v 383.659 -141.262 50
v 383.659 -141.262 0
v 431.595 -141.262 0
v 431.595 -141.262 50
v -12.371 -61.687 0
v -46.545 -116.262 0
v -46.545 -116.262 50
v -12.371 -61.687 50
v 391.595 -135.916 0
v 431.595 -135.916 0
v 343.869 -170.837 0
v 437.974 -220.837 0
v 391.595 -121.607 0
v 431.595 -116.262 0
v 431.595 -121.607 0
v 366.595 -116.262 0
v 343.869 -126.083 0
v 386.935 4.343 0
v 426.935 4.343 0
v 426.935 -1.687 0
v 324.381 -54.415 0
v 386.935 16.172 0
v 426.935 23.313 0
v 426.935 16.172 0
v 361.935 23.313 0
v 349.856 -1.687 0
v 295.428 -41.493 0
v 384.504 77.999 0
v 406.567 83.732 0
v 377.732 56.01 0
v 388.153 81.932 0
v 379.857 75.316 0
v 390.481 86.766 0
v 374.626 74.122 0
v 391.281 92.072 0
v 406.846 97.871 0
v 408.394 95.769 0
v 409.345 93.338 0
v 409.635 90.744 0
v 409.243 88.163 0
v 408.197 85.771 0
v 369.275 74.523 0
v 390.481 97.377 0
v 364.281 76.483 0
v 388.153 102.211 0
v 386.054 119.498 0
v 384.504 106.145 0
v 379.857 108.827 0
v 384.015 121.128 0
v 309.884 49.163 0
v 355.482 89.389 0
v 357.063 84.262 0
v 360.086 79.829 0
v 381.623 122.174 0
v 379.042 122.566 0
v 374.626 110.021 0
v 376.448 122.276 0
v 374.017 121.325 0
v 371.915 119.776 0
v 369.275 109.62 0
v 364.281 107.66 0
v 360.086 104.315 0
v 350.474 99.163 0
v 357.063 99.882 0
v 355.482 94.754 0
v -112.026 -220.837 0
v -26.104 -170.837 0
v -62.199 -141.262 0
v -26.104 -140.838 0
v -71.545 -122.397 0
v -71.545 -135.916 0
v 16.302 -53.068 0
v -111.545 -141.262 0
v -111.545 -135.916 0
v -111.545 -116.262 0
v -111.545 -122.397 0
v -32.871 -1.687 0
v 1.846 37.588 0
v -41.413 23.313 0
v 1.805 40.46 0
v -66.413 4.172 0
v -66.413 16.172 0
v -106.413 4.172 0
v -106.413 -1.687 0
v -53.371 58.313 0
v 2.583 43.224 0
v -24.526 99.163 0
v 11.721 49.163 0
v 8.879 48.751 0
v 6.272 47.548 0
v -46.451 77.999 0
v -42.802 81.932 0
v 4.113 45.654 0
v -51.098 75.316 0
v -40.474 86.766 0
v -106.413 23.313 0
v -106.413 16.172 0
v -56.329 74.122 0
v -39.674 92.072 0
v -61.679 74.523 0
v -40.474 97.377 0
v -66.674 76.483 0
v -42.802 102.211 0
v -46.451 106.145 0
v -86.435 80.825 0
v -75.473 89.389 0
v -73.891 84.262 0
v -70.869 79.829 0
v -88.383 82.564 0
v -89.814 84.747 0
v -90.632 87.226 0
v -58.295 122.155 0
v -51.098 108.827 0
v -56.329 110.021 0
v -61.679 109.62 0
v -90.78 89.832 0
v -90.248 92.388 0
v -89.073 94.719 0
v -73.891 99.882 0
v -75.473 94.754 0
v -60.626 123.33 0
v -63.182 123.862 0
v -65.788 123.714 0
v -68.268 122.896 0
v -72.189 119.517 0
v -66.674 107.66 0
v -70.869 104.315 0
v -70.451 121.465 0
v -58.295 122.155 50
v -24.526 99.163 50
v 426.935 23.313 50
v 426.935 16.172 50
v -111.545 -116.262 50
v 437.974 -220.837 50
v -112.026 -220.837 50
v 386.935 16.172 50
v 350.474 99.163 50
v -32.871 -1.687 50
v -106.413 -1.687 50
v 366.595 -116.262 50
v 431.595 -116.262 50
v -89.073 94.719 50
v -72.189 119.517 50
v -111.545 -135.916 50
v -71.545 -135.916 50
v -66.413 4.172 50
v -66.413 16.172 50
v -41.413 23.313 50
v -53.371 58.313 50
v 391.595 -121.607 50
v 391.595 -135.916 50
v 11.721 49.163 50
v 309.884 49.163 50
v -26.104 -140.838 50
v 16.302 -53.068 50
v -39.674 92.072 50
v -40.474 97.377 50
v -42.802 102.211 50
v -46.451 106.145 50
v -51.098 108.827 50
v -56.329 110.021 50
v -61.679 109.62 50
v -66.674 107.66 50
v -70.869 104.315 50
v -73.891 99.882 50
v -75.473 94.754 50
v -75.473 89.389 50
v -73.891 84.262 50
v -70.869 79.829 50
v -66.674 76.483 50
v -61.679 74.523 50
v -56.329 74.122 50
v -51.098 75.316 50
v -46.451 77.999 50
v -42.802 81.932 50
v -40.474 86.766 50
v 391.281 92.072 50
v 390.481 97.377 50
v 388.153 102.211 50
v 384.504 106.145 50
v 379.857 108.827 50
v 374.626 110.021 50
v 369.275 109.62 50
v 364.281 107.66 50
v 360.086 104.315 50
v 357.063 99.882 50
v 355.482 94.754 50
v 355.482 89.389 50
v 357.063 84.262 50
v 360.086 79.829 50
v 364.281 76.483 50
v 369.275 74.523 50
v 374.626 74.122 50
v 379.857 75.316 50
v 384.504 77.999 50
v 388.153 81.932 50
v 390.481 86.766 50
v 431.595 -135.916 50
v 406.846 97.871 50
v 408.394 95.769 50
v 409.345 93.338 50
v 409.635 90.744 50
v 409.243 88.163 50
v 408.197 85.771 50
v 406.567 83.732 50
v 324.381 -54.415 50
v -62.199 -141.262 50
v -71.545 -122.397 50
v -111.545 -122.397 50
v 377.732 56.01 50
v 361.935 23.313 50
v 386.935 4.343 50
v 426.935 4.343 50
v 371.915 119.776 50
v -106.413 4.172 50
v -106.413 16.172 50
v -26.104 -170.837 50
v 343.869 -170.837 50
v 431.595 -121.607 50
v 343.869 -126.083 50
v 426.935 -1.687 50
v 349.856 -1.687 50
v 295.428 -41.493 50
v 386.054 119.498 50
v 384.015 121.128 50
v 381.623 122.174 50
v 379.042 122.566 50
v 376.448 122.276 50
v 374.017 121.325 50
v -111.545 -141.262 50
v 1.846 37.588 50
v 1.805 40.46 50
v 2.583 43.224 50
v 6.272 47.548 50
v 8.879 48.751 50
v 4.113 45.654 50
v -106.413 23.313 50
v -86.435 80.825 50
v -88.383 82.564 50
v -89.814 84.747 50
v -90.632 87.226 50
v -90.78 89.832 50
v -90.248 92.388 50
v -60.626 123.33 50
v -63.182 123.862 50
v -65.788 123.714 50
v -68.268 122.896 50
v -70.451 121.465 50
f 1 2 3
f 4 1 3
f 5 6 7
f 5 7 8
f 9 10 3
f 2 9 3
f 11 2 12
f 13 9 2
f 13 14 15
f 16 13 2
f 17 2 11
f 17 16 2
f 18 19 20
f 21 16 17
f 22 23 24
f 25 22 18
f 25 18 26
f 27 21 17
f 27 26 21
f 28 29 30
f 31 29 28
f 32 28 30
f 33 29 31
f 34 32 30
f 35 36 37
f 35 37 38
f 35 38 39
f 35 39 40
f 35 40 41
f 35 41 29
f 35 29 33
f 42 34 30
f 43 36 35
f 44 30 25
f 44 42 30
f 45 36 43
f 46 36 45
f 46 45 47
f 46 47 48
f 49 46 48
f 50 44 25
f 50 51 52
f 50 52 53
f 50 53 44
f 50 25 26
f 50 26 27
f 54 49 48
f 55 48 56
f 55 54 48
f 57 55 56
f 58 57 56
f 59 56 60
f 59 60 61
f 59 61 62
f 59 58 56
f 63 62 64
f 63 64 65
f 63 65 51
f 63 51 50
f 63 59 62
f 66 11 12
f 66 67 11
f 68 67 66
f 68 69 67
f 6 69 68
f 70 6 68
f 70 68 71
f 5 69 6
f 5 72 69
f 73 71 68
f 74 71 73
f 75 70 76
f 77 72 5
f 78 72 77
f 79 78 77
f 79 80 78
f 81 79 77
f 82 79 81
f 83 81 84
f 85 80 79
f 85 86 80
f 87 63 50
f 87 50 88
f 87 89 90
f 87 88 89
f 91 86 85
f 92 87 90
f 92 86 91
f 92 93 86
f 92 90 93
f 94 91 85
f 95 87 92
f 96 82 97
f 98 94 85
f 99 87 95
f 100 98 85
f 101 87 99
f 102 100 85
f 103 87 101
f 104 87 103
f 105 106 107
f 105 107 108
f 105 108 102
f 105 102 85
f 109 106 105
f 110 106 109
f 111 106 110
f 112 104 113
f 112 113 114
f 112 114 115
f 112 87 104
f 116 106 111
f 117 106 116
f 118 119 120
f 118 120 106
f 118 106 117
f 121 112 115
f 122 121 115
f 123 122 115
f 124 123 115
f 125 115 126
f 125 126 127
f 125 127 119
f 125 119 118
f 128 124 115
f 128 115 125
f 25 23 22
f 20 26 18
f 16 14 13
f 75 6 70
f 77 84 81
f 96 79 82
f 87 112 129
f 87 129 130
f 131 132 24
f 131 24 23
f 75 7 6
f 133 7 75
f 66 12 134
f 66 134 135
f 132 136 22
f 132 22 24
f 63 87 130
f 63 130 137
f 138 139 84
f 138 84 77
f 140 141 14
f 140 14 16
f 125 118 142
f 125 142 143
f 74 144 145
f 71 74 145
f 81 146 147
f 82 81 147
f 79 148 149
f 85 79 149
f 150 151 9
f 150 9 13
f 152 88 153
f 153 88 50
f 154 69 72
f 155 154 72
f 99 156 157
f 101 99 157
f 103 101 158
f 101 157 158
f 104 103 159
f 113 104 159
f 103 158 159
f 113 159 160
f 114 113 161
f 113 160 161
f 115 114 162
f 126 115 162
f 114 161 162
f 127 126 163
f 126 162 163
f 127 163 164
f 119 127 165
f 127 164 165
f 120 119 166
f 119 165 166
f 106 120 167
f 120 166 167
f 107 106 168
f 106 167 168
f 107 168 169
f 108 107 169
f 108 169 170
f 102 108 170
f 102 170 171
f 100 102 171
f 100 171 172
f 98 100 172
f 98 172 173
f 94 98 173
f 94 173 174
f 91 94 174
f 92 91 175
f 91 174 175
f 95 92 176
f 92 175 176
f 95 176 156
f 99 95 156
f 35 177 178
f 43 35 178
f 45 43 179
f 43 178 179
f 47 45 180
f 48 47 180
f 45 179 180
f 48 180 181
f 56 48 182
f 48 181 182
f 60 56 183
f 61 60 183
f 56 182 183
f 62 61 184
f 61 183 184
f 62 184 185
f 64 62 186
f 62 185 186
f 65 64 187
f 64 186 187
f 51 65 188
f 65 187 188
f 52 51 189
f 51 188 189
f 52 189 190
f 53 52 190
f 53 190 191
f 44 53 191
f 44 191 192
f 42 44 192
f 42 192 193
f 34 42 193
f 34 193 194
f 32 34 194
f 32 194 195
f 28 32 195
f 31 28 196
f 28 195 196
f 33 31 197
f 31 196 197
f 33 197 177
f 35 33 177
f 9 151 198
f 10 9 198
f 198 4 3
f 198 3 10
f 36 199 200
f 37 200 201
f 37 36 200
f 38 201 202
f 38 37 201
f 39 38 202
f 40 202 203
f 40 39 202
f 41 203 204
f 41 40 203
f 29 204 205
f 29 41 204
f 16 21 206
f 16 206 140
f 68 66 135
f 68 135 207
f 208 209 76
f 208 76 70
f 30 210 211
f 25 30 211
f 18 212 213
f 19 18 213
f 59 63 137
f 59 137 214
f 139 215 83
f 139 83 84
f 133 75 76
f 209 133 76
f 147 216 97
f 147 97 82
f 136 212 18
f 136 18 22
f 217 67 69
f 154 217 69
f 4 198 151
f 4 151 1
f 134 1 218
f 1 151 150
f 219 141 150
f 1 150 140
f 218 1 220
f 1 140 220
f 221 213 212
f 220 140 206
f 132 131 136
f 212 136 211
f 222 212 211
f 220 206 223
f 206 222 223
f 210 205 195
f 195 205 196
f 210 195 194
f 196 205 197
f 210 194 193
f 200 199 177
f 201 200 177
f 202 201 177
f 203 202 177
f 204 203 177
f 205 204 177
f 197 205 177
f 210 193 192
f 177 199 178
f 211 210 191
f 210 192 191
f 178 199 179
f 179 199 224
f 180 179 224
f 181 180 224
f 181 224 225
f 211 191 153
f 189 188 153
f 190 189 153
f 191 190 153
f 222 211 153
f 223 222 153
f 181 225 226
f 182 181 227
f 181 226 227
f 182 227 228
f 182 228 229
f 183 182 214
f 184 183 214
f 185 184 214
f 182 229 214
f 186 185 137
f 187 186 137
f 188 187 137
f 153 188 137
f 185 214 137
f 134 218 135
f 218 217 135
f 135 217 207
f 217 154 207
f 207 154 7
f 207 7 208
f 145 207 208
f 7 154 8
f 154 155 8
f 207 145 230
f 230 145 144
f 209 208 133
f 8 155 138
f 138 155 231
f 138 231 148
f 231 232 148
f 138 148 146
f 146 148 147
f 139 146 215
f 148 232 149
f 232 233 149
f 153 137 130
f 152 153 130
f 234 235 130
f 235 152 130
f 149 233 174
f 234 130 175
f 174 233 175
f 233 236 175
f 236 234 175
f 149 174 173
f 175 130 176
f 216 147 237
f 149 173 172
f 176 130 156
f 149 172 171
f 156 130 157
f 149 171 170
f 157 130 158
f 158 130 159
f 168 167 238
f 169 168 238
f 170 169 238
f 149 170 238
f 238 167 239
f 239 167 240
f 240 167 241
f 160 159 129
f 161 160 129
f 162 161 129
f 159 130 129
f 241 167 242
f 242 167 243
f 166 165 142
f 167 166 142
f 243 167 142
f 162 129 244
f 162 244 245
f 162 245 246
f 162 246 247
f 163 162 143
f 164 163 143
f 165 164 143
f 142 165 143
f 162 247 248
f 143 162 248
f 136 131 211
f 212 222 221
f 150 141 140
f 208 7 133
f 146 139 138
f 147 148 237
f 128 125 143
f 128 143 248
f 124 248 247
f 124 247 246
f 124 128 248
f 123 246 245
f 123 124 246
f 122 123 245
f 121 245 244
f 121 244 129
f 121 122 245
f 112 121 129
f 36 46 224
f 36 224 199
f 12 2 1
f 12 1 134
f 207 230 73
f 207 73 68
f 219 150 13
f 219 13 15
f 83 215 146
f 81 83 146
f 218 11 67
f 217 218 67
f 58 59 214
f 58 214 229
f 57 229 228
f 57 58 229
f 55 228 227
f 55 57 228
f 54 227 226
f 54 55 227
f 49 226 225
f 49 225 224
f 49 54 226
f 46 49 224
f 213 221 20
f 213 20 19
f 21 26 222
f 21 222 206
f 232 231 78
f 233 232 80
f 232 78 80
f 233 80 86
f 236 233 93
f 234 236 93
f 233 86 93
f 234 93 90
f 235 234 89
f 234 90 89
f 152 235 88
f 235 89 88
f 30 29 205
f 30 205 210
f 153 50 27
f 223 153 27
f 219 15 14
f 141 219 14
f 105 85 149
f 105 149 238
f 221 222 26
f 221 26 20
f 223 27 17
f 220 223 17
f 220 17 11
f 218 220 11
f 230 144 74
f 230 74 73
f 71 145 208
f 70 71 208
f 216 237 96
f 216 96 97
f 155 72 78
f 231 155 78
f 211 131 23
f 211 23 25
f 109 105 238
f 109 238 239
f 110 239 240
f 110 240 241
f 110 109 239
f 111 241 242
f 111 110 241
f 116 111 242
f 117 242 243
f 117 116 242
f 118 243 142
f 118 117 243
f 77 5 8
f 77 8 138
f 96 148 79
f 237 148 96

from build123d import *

# Parameters (mm, degrees)
BOSS_EXTRUDE1_DEPTH = 50
SKETCH2_R           = 18
CUT_EXTRUDE1_DEPTH  = 50
BOSS_EXTRUDE2_DEPTH = 50
SKETCH4_W           = 40
SKETCH4_H           = 12
SKETCH4_H_2         = 13.518900255
SKETCH4_H_3         = 14.308533634
SKETCH4_H_4         = 11.829037722
CUT_EXTRUDE2_DEPTH  = 50


with BuildPart() as part:
    # Sketch1 → Boss-Extrude1 (new body)
    with BuildSketch(Plane.XY):
        with BuildLine():
            Line((-24.526421899, 99.163181947), (350.473578101, 99.163181947))
            Line((350.473578101, 99.163181947), (371.914769804, 119.776399502))
            ThreePointArc((371.914769804, 119.776399502), (379.042121684, 122.565574817), (386.05416531, 119.49802075))
            Line((386.05416531, 119.49802075), (406.845690441, 97.871359363))
            ThreePointArc((406.845690441, 97.871359363), (409.634865756, 90.744007483), (406.567311689, 83.731963857))
            Line((406.567311689, 83.731963857), (377.731763174, 56.009930349))
            Line((377.731763174, 56.009930349), (324.38122579, -54.414567916))
            Line((324.38122579, -54.414567916), (437.973578101, -220.836818053))
            Line((437.973578101, -220.836818053), (-112.026421899, -220.836818053))
            Line((-112.026421899, -220.836818053), (-12.371310843, -61.686567499))
            Line((-12.371310843, -61.686567499), (-53.371269125, 58.313432501))
            Line((-53.371269125, 58.313432501), (-86.435025525, 80.825385165))
            ThreePointArc((-86.435025525, 80.825385165), (-90.631527546, 87.226011271), (-89.072976459, 94.719312431))
            Line((-89.072976459, 94.719312431), (-72.189011961, 119.517129731))
            ThreePointArc((-72.189011961, 119.517129731), (-65.788385855, 123.713631752), (-58.295084695, 122.155080665))
            Line((-58.295084695, 122.155080665), (-24.526421899, 99.163181947))
        make_face()
        with BuildLine():
            Line((11.720938897, 49.163181947), (309.883964405, 49.163181947))
            Line((309.883964405, 49.163181947), (295.427890661, -41.493267931))
            Line((295.427890661, -41.493267931), (343.868993372, -126.082556787))
            Line((343.868993372, -126.082556787), (343.868993372, -170.836818053))
            Line((343.868993372, -170.836818053), (-26.103706827, -170.836818053))
            Line((-26.103706827, -170.836818053), (-26.103706827, -140.838487627))
            Line((-26.103706827, -140.838487627), (16.301775704, -53.067972804))
            Line((16.301775704, -53.067972804), (1.84570196, 37.588477074))
            ThreePointArc((1.84570196, 37.588477074), (4.113473855, 45.653673117), (11.720938897, 49.163181947))
        make_face(mode=Mode.SUBTRACT)
    extrude(amount=BOSS_EXTRUDE1_DEPTH)

    # Sketch2 → Cut-Extrude1 (cut)
    with BuildSketch(Plane.XY.offset(50)):
        with Locations((-57.673911362, 92.071701739)):
            Circle(SKETCH2_R)
        with Locations((373.28081392, 92.071701739)):
            Circle(SKETCH2_R)
    extrude(amount=-CUT_EXTRUDE1_DEPTH, mode=Mode.SUBTRACT)

    # Sketch3 → Boss-Extrude2 (add)
    with BuildSketch(Plane.XY.offset(50)):
        Polygon((-32.871289984, -1.686567499), (-41.412947959, 23.313432501), (-106.412947959, 23.313432501), (-106.412947959, -1.686567499), align=None)
        Polygon((-62.198866371, -141.261692776), (-46.54461658, -116.261692776), (-111.54461658, -116.261692776), (-111.54461658, -141.261692776), align=None)
        Polygon((426.934763793, 23.313432501), (361.934763793, 23.313432501), (349.856253539, -1.686567499), (426.934763793, -1.686567499), align=None)
        Polygon((431.595295067, -116.261692776), (366.595295067, -116.261692776), (383.659172075, -141.261692776), (431.595295067, -141.261692776), align=None)
    extrude(amount=-BOSS_EXTRUDE2_DEPTH)

    # Sketch4 → Cut-Extrude2 (cut)
    with BuildSketch(Plane.XY.offset(50)):
        with Locations((-86.412947959, 10.171668266)):
            Rectangle(SKETCH4_W, SKETCH4_H)
        with Locations((-91.54461658, -129.156509465)):
            Rectangle(SKETCH4_W, SKETCH4_H_2)
        with Locations((411.595295067, -128.761692776)):
            Rectangle(SKETCH4_W, SKETCH4_H_3)
        with Locations((406.934763793, 10.257149405)):
            Rectangle(SKETCH4_W, SKETCH4_H_4)
    extrude(amount=-CUT_EXTRUDE2_DEPTH, mode=Mode.SUBTRACT)


solid = part.part
